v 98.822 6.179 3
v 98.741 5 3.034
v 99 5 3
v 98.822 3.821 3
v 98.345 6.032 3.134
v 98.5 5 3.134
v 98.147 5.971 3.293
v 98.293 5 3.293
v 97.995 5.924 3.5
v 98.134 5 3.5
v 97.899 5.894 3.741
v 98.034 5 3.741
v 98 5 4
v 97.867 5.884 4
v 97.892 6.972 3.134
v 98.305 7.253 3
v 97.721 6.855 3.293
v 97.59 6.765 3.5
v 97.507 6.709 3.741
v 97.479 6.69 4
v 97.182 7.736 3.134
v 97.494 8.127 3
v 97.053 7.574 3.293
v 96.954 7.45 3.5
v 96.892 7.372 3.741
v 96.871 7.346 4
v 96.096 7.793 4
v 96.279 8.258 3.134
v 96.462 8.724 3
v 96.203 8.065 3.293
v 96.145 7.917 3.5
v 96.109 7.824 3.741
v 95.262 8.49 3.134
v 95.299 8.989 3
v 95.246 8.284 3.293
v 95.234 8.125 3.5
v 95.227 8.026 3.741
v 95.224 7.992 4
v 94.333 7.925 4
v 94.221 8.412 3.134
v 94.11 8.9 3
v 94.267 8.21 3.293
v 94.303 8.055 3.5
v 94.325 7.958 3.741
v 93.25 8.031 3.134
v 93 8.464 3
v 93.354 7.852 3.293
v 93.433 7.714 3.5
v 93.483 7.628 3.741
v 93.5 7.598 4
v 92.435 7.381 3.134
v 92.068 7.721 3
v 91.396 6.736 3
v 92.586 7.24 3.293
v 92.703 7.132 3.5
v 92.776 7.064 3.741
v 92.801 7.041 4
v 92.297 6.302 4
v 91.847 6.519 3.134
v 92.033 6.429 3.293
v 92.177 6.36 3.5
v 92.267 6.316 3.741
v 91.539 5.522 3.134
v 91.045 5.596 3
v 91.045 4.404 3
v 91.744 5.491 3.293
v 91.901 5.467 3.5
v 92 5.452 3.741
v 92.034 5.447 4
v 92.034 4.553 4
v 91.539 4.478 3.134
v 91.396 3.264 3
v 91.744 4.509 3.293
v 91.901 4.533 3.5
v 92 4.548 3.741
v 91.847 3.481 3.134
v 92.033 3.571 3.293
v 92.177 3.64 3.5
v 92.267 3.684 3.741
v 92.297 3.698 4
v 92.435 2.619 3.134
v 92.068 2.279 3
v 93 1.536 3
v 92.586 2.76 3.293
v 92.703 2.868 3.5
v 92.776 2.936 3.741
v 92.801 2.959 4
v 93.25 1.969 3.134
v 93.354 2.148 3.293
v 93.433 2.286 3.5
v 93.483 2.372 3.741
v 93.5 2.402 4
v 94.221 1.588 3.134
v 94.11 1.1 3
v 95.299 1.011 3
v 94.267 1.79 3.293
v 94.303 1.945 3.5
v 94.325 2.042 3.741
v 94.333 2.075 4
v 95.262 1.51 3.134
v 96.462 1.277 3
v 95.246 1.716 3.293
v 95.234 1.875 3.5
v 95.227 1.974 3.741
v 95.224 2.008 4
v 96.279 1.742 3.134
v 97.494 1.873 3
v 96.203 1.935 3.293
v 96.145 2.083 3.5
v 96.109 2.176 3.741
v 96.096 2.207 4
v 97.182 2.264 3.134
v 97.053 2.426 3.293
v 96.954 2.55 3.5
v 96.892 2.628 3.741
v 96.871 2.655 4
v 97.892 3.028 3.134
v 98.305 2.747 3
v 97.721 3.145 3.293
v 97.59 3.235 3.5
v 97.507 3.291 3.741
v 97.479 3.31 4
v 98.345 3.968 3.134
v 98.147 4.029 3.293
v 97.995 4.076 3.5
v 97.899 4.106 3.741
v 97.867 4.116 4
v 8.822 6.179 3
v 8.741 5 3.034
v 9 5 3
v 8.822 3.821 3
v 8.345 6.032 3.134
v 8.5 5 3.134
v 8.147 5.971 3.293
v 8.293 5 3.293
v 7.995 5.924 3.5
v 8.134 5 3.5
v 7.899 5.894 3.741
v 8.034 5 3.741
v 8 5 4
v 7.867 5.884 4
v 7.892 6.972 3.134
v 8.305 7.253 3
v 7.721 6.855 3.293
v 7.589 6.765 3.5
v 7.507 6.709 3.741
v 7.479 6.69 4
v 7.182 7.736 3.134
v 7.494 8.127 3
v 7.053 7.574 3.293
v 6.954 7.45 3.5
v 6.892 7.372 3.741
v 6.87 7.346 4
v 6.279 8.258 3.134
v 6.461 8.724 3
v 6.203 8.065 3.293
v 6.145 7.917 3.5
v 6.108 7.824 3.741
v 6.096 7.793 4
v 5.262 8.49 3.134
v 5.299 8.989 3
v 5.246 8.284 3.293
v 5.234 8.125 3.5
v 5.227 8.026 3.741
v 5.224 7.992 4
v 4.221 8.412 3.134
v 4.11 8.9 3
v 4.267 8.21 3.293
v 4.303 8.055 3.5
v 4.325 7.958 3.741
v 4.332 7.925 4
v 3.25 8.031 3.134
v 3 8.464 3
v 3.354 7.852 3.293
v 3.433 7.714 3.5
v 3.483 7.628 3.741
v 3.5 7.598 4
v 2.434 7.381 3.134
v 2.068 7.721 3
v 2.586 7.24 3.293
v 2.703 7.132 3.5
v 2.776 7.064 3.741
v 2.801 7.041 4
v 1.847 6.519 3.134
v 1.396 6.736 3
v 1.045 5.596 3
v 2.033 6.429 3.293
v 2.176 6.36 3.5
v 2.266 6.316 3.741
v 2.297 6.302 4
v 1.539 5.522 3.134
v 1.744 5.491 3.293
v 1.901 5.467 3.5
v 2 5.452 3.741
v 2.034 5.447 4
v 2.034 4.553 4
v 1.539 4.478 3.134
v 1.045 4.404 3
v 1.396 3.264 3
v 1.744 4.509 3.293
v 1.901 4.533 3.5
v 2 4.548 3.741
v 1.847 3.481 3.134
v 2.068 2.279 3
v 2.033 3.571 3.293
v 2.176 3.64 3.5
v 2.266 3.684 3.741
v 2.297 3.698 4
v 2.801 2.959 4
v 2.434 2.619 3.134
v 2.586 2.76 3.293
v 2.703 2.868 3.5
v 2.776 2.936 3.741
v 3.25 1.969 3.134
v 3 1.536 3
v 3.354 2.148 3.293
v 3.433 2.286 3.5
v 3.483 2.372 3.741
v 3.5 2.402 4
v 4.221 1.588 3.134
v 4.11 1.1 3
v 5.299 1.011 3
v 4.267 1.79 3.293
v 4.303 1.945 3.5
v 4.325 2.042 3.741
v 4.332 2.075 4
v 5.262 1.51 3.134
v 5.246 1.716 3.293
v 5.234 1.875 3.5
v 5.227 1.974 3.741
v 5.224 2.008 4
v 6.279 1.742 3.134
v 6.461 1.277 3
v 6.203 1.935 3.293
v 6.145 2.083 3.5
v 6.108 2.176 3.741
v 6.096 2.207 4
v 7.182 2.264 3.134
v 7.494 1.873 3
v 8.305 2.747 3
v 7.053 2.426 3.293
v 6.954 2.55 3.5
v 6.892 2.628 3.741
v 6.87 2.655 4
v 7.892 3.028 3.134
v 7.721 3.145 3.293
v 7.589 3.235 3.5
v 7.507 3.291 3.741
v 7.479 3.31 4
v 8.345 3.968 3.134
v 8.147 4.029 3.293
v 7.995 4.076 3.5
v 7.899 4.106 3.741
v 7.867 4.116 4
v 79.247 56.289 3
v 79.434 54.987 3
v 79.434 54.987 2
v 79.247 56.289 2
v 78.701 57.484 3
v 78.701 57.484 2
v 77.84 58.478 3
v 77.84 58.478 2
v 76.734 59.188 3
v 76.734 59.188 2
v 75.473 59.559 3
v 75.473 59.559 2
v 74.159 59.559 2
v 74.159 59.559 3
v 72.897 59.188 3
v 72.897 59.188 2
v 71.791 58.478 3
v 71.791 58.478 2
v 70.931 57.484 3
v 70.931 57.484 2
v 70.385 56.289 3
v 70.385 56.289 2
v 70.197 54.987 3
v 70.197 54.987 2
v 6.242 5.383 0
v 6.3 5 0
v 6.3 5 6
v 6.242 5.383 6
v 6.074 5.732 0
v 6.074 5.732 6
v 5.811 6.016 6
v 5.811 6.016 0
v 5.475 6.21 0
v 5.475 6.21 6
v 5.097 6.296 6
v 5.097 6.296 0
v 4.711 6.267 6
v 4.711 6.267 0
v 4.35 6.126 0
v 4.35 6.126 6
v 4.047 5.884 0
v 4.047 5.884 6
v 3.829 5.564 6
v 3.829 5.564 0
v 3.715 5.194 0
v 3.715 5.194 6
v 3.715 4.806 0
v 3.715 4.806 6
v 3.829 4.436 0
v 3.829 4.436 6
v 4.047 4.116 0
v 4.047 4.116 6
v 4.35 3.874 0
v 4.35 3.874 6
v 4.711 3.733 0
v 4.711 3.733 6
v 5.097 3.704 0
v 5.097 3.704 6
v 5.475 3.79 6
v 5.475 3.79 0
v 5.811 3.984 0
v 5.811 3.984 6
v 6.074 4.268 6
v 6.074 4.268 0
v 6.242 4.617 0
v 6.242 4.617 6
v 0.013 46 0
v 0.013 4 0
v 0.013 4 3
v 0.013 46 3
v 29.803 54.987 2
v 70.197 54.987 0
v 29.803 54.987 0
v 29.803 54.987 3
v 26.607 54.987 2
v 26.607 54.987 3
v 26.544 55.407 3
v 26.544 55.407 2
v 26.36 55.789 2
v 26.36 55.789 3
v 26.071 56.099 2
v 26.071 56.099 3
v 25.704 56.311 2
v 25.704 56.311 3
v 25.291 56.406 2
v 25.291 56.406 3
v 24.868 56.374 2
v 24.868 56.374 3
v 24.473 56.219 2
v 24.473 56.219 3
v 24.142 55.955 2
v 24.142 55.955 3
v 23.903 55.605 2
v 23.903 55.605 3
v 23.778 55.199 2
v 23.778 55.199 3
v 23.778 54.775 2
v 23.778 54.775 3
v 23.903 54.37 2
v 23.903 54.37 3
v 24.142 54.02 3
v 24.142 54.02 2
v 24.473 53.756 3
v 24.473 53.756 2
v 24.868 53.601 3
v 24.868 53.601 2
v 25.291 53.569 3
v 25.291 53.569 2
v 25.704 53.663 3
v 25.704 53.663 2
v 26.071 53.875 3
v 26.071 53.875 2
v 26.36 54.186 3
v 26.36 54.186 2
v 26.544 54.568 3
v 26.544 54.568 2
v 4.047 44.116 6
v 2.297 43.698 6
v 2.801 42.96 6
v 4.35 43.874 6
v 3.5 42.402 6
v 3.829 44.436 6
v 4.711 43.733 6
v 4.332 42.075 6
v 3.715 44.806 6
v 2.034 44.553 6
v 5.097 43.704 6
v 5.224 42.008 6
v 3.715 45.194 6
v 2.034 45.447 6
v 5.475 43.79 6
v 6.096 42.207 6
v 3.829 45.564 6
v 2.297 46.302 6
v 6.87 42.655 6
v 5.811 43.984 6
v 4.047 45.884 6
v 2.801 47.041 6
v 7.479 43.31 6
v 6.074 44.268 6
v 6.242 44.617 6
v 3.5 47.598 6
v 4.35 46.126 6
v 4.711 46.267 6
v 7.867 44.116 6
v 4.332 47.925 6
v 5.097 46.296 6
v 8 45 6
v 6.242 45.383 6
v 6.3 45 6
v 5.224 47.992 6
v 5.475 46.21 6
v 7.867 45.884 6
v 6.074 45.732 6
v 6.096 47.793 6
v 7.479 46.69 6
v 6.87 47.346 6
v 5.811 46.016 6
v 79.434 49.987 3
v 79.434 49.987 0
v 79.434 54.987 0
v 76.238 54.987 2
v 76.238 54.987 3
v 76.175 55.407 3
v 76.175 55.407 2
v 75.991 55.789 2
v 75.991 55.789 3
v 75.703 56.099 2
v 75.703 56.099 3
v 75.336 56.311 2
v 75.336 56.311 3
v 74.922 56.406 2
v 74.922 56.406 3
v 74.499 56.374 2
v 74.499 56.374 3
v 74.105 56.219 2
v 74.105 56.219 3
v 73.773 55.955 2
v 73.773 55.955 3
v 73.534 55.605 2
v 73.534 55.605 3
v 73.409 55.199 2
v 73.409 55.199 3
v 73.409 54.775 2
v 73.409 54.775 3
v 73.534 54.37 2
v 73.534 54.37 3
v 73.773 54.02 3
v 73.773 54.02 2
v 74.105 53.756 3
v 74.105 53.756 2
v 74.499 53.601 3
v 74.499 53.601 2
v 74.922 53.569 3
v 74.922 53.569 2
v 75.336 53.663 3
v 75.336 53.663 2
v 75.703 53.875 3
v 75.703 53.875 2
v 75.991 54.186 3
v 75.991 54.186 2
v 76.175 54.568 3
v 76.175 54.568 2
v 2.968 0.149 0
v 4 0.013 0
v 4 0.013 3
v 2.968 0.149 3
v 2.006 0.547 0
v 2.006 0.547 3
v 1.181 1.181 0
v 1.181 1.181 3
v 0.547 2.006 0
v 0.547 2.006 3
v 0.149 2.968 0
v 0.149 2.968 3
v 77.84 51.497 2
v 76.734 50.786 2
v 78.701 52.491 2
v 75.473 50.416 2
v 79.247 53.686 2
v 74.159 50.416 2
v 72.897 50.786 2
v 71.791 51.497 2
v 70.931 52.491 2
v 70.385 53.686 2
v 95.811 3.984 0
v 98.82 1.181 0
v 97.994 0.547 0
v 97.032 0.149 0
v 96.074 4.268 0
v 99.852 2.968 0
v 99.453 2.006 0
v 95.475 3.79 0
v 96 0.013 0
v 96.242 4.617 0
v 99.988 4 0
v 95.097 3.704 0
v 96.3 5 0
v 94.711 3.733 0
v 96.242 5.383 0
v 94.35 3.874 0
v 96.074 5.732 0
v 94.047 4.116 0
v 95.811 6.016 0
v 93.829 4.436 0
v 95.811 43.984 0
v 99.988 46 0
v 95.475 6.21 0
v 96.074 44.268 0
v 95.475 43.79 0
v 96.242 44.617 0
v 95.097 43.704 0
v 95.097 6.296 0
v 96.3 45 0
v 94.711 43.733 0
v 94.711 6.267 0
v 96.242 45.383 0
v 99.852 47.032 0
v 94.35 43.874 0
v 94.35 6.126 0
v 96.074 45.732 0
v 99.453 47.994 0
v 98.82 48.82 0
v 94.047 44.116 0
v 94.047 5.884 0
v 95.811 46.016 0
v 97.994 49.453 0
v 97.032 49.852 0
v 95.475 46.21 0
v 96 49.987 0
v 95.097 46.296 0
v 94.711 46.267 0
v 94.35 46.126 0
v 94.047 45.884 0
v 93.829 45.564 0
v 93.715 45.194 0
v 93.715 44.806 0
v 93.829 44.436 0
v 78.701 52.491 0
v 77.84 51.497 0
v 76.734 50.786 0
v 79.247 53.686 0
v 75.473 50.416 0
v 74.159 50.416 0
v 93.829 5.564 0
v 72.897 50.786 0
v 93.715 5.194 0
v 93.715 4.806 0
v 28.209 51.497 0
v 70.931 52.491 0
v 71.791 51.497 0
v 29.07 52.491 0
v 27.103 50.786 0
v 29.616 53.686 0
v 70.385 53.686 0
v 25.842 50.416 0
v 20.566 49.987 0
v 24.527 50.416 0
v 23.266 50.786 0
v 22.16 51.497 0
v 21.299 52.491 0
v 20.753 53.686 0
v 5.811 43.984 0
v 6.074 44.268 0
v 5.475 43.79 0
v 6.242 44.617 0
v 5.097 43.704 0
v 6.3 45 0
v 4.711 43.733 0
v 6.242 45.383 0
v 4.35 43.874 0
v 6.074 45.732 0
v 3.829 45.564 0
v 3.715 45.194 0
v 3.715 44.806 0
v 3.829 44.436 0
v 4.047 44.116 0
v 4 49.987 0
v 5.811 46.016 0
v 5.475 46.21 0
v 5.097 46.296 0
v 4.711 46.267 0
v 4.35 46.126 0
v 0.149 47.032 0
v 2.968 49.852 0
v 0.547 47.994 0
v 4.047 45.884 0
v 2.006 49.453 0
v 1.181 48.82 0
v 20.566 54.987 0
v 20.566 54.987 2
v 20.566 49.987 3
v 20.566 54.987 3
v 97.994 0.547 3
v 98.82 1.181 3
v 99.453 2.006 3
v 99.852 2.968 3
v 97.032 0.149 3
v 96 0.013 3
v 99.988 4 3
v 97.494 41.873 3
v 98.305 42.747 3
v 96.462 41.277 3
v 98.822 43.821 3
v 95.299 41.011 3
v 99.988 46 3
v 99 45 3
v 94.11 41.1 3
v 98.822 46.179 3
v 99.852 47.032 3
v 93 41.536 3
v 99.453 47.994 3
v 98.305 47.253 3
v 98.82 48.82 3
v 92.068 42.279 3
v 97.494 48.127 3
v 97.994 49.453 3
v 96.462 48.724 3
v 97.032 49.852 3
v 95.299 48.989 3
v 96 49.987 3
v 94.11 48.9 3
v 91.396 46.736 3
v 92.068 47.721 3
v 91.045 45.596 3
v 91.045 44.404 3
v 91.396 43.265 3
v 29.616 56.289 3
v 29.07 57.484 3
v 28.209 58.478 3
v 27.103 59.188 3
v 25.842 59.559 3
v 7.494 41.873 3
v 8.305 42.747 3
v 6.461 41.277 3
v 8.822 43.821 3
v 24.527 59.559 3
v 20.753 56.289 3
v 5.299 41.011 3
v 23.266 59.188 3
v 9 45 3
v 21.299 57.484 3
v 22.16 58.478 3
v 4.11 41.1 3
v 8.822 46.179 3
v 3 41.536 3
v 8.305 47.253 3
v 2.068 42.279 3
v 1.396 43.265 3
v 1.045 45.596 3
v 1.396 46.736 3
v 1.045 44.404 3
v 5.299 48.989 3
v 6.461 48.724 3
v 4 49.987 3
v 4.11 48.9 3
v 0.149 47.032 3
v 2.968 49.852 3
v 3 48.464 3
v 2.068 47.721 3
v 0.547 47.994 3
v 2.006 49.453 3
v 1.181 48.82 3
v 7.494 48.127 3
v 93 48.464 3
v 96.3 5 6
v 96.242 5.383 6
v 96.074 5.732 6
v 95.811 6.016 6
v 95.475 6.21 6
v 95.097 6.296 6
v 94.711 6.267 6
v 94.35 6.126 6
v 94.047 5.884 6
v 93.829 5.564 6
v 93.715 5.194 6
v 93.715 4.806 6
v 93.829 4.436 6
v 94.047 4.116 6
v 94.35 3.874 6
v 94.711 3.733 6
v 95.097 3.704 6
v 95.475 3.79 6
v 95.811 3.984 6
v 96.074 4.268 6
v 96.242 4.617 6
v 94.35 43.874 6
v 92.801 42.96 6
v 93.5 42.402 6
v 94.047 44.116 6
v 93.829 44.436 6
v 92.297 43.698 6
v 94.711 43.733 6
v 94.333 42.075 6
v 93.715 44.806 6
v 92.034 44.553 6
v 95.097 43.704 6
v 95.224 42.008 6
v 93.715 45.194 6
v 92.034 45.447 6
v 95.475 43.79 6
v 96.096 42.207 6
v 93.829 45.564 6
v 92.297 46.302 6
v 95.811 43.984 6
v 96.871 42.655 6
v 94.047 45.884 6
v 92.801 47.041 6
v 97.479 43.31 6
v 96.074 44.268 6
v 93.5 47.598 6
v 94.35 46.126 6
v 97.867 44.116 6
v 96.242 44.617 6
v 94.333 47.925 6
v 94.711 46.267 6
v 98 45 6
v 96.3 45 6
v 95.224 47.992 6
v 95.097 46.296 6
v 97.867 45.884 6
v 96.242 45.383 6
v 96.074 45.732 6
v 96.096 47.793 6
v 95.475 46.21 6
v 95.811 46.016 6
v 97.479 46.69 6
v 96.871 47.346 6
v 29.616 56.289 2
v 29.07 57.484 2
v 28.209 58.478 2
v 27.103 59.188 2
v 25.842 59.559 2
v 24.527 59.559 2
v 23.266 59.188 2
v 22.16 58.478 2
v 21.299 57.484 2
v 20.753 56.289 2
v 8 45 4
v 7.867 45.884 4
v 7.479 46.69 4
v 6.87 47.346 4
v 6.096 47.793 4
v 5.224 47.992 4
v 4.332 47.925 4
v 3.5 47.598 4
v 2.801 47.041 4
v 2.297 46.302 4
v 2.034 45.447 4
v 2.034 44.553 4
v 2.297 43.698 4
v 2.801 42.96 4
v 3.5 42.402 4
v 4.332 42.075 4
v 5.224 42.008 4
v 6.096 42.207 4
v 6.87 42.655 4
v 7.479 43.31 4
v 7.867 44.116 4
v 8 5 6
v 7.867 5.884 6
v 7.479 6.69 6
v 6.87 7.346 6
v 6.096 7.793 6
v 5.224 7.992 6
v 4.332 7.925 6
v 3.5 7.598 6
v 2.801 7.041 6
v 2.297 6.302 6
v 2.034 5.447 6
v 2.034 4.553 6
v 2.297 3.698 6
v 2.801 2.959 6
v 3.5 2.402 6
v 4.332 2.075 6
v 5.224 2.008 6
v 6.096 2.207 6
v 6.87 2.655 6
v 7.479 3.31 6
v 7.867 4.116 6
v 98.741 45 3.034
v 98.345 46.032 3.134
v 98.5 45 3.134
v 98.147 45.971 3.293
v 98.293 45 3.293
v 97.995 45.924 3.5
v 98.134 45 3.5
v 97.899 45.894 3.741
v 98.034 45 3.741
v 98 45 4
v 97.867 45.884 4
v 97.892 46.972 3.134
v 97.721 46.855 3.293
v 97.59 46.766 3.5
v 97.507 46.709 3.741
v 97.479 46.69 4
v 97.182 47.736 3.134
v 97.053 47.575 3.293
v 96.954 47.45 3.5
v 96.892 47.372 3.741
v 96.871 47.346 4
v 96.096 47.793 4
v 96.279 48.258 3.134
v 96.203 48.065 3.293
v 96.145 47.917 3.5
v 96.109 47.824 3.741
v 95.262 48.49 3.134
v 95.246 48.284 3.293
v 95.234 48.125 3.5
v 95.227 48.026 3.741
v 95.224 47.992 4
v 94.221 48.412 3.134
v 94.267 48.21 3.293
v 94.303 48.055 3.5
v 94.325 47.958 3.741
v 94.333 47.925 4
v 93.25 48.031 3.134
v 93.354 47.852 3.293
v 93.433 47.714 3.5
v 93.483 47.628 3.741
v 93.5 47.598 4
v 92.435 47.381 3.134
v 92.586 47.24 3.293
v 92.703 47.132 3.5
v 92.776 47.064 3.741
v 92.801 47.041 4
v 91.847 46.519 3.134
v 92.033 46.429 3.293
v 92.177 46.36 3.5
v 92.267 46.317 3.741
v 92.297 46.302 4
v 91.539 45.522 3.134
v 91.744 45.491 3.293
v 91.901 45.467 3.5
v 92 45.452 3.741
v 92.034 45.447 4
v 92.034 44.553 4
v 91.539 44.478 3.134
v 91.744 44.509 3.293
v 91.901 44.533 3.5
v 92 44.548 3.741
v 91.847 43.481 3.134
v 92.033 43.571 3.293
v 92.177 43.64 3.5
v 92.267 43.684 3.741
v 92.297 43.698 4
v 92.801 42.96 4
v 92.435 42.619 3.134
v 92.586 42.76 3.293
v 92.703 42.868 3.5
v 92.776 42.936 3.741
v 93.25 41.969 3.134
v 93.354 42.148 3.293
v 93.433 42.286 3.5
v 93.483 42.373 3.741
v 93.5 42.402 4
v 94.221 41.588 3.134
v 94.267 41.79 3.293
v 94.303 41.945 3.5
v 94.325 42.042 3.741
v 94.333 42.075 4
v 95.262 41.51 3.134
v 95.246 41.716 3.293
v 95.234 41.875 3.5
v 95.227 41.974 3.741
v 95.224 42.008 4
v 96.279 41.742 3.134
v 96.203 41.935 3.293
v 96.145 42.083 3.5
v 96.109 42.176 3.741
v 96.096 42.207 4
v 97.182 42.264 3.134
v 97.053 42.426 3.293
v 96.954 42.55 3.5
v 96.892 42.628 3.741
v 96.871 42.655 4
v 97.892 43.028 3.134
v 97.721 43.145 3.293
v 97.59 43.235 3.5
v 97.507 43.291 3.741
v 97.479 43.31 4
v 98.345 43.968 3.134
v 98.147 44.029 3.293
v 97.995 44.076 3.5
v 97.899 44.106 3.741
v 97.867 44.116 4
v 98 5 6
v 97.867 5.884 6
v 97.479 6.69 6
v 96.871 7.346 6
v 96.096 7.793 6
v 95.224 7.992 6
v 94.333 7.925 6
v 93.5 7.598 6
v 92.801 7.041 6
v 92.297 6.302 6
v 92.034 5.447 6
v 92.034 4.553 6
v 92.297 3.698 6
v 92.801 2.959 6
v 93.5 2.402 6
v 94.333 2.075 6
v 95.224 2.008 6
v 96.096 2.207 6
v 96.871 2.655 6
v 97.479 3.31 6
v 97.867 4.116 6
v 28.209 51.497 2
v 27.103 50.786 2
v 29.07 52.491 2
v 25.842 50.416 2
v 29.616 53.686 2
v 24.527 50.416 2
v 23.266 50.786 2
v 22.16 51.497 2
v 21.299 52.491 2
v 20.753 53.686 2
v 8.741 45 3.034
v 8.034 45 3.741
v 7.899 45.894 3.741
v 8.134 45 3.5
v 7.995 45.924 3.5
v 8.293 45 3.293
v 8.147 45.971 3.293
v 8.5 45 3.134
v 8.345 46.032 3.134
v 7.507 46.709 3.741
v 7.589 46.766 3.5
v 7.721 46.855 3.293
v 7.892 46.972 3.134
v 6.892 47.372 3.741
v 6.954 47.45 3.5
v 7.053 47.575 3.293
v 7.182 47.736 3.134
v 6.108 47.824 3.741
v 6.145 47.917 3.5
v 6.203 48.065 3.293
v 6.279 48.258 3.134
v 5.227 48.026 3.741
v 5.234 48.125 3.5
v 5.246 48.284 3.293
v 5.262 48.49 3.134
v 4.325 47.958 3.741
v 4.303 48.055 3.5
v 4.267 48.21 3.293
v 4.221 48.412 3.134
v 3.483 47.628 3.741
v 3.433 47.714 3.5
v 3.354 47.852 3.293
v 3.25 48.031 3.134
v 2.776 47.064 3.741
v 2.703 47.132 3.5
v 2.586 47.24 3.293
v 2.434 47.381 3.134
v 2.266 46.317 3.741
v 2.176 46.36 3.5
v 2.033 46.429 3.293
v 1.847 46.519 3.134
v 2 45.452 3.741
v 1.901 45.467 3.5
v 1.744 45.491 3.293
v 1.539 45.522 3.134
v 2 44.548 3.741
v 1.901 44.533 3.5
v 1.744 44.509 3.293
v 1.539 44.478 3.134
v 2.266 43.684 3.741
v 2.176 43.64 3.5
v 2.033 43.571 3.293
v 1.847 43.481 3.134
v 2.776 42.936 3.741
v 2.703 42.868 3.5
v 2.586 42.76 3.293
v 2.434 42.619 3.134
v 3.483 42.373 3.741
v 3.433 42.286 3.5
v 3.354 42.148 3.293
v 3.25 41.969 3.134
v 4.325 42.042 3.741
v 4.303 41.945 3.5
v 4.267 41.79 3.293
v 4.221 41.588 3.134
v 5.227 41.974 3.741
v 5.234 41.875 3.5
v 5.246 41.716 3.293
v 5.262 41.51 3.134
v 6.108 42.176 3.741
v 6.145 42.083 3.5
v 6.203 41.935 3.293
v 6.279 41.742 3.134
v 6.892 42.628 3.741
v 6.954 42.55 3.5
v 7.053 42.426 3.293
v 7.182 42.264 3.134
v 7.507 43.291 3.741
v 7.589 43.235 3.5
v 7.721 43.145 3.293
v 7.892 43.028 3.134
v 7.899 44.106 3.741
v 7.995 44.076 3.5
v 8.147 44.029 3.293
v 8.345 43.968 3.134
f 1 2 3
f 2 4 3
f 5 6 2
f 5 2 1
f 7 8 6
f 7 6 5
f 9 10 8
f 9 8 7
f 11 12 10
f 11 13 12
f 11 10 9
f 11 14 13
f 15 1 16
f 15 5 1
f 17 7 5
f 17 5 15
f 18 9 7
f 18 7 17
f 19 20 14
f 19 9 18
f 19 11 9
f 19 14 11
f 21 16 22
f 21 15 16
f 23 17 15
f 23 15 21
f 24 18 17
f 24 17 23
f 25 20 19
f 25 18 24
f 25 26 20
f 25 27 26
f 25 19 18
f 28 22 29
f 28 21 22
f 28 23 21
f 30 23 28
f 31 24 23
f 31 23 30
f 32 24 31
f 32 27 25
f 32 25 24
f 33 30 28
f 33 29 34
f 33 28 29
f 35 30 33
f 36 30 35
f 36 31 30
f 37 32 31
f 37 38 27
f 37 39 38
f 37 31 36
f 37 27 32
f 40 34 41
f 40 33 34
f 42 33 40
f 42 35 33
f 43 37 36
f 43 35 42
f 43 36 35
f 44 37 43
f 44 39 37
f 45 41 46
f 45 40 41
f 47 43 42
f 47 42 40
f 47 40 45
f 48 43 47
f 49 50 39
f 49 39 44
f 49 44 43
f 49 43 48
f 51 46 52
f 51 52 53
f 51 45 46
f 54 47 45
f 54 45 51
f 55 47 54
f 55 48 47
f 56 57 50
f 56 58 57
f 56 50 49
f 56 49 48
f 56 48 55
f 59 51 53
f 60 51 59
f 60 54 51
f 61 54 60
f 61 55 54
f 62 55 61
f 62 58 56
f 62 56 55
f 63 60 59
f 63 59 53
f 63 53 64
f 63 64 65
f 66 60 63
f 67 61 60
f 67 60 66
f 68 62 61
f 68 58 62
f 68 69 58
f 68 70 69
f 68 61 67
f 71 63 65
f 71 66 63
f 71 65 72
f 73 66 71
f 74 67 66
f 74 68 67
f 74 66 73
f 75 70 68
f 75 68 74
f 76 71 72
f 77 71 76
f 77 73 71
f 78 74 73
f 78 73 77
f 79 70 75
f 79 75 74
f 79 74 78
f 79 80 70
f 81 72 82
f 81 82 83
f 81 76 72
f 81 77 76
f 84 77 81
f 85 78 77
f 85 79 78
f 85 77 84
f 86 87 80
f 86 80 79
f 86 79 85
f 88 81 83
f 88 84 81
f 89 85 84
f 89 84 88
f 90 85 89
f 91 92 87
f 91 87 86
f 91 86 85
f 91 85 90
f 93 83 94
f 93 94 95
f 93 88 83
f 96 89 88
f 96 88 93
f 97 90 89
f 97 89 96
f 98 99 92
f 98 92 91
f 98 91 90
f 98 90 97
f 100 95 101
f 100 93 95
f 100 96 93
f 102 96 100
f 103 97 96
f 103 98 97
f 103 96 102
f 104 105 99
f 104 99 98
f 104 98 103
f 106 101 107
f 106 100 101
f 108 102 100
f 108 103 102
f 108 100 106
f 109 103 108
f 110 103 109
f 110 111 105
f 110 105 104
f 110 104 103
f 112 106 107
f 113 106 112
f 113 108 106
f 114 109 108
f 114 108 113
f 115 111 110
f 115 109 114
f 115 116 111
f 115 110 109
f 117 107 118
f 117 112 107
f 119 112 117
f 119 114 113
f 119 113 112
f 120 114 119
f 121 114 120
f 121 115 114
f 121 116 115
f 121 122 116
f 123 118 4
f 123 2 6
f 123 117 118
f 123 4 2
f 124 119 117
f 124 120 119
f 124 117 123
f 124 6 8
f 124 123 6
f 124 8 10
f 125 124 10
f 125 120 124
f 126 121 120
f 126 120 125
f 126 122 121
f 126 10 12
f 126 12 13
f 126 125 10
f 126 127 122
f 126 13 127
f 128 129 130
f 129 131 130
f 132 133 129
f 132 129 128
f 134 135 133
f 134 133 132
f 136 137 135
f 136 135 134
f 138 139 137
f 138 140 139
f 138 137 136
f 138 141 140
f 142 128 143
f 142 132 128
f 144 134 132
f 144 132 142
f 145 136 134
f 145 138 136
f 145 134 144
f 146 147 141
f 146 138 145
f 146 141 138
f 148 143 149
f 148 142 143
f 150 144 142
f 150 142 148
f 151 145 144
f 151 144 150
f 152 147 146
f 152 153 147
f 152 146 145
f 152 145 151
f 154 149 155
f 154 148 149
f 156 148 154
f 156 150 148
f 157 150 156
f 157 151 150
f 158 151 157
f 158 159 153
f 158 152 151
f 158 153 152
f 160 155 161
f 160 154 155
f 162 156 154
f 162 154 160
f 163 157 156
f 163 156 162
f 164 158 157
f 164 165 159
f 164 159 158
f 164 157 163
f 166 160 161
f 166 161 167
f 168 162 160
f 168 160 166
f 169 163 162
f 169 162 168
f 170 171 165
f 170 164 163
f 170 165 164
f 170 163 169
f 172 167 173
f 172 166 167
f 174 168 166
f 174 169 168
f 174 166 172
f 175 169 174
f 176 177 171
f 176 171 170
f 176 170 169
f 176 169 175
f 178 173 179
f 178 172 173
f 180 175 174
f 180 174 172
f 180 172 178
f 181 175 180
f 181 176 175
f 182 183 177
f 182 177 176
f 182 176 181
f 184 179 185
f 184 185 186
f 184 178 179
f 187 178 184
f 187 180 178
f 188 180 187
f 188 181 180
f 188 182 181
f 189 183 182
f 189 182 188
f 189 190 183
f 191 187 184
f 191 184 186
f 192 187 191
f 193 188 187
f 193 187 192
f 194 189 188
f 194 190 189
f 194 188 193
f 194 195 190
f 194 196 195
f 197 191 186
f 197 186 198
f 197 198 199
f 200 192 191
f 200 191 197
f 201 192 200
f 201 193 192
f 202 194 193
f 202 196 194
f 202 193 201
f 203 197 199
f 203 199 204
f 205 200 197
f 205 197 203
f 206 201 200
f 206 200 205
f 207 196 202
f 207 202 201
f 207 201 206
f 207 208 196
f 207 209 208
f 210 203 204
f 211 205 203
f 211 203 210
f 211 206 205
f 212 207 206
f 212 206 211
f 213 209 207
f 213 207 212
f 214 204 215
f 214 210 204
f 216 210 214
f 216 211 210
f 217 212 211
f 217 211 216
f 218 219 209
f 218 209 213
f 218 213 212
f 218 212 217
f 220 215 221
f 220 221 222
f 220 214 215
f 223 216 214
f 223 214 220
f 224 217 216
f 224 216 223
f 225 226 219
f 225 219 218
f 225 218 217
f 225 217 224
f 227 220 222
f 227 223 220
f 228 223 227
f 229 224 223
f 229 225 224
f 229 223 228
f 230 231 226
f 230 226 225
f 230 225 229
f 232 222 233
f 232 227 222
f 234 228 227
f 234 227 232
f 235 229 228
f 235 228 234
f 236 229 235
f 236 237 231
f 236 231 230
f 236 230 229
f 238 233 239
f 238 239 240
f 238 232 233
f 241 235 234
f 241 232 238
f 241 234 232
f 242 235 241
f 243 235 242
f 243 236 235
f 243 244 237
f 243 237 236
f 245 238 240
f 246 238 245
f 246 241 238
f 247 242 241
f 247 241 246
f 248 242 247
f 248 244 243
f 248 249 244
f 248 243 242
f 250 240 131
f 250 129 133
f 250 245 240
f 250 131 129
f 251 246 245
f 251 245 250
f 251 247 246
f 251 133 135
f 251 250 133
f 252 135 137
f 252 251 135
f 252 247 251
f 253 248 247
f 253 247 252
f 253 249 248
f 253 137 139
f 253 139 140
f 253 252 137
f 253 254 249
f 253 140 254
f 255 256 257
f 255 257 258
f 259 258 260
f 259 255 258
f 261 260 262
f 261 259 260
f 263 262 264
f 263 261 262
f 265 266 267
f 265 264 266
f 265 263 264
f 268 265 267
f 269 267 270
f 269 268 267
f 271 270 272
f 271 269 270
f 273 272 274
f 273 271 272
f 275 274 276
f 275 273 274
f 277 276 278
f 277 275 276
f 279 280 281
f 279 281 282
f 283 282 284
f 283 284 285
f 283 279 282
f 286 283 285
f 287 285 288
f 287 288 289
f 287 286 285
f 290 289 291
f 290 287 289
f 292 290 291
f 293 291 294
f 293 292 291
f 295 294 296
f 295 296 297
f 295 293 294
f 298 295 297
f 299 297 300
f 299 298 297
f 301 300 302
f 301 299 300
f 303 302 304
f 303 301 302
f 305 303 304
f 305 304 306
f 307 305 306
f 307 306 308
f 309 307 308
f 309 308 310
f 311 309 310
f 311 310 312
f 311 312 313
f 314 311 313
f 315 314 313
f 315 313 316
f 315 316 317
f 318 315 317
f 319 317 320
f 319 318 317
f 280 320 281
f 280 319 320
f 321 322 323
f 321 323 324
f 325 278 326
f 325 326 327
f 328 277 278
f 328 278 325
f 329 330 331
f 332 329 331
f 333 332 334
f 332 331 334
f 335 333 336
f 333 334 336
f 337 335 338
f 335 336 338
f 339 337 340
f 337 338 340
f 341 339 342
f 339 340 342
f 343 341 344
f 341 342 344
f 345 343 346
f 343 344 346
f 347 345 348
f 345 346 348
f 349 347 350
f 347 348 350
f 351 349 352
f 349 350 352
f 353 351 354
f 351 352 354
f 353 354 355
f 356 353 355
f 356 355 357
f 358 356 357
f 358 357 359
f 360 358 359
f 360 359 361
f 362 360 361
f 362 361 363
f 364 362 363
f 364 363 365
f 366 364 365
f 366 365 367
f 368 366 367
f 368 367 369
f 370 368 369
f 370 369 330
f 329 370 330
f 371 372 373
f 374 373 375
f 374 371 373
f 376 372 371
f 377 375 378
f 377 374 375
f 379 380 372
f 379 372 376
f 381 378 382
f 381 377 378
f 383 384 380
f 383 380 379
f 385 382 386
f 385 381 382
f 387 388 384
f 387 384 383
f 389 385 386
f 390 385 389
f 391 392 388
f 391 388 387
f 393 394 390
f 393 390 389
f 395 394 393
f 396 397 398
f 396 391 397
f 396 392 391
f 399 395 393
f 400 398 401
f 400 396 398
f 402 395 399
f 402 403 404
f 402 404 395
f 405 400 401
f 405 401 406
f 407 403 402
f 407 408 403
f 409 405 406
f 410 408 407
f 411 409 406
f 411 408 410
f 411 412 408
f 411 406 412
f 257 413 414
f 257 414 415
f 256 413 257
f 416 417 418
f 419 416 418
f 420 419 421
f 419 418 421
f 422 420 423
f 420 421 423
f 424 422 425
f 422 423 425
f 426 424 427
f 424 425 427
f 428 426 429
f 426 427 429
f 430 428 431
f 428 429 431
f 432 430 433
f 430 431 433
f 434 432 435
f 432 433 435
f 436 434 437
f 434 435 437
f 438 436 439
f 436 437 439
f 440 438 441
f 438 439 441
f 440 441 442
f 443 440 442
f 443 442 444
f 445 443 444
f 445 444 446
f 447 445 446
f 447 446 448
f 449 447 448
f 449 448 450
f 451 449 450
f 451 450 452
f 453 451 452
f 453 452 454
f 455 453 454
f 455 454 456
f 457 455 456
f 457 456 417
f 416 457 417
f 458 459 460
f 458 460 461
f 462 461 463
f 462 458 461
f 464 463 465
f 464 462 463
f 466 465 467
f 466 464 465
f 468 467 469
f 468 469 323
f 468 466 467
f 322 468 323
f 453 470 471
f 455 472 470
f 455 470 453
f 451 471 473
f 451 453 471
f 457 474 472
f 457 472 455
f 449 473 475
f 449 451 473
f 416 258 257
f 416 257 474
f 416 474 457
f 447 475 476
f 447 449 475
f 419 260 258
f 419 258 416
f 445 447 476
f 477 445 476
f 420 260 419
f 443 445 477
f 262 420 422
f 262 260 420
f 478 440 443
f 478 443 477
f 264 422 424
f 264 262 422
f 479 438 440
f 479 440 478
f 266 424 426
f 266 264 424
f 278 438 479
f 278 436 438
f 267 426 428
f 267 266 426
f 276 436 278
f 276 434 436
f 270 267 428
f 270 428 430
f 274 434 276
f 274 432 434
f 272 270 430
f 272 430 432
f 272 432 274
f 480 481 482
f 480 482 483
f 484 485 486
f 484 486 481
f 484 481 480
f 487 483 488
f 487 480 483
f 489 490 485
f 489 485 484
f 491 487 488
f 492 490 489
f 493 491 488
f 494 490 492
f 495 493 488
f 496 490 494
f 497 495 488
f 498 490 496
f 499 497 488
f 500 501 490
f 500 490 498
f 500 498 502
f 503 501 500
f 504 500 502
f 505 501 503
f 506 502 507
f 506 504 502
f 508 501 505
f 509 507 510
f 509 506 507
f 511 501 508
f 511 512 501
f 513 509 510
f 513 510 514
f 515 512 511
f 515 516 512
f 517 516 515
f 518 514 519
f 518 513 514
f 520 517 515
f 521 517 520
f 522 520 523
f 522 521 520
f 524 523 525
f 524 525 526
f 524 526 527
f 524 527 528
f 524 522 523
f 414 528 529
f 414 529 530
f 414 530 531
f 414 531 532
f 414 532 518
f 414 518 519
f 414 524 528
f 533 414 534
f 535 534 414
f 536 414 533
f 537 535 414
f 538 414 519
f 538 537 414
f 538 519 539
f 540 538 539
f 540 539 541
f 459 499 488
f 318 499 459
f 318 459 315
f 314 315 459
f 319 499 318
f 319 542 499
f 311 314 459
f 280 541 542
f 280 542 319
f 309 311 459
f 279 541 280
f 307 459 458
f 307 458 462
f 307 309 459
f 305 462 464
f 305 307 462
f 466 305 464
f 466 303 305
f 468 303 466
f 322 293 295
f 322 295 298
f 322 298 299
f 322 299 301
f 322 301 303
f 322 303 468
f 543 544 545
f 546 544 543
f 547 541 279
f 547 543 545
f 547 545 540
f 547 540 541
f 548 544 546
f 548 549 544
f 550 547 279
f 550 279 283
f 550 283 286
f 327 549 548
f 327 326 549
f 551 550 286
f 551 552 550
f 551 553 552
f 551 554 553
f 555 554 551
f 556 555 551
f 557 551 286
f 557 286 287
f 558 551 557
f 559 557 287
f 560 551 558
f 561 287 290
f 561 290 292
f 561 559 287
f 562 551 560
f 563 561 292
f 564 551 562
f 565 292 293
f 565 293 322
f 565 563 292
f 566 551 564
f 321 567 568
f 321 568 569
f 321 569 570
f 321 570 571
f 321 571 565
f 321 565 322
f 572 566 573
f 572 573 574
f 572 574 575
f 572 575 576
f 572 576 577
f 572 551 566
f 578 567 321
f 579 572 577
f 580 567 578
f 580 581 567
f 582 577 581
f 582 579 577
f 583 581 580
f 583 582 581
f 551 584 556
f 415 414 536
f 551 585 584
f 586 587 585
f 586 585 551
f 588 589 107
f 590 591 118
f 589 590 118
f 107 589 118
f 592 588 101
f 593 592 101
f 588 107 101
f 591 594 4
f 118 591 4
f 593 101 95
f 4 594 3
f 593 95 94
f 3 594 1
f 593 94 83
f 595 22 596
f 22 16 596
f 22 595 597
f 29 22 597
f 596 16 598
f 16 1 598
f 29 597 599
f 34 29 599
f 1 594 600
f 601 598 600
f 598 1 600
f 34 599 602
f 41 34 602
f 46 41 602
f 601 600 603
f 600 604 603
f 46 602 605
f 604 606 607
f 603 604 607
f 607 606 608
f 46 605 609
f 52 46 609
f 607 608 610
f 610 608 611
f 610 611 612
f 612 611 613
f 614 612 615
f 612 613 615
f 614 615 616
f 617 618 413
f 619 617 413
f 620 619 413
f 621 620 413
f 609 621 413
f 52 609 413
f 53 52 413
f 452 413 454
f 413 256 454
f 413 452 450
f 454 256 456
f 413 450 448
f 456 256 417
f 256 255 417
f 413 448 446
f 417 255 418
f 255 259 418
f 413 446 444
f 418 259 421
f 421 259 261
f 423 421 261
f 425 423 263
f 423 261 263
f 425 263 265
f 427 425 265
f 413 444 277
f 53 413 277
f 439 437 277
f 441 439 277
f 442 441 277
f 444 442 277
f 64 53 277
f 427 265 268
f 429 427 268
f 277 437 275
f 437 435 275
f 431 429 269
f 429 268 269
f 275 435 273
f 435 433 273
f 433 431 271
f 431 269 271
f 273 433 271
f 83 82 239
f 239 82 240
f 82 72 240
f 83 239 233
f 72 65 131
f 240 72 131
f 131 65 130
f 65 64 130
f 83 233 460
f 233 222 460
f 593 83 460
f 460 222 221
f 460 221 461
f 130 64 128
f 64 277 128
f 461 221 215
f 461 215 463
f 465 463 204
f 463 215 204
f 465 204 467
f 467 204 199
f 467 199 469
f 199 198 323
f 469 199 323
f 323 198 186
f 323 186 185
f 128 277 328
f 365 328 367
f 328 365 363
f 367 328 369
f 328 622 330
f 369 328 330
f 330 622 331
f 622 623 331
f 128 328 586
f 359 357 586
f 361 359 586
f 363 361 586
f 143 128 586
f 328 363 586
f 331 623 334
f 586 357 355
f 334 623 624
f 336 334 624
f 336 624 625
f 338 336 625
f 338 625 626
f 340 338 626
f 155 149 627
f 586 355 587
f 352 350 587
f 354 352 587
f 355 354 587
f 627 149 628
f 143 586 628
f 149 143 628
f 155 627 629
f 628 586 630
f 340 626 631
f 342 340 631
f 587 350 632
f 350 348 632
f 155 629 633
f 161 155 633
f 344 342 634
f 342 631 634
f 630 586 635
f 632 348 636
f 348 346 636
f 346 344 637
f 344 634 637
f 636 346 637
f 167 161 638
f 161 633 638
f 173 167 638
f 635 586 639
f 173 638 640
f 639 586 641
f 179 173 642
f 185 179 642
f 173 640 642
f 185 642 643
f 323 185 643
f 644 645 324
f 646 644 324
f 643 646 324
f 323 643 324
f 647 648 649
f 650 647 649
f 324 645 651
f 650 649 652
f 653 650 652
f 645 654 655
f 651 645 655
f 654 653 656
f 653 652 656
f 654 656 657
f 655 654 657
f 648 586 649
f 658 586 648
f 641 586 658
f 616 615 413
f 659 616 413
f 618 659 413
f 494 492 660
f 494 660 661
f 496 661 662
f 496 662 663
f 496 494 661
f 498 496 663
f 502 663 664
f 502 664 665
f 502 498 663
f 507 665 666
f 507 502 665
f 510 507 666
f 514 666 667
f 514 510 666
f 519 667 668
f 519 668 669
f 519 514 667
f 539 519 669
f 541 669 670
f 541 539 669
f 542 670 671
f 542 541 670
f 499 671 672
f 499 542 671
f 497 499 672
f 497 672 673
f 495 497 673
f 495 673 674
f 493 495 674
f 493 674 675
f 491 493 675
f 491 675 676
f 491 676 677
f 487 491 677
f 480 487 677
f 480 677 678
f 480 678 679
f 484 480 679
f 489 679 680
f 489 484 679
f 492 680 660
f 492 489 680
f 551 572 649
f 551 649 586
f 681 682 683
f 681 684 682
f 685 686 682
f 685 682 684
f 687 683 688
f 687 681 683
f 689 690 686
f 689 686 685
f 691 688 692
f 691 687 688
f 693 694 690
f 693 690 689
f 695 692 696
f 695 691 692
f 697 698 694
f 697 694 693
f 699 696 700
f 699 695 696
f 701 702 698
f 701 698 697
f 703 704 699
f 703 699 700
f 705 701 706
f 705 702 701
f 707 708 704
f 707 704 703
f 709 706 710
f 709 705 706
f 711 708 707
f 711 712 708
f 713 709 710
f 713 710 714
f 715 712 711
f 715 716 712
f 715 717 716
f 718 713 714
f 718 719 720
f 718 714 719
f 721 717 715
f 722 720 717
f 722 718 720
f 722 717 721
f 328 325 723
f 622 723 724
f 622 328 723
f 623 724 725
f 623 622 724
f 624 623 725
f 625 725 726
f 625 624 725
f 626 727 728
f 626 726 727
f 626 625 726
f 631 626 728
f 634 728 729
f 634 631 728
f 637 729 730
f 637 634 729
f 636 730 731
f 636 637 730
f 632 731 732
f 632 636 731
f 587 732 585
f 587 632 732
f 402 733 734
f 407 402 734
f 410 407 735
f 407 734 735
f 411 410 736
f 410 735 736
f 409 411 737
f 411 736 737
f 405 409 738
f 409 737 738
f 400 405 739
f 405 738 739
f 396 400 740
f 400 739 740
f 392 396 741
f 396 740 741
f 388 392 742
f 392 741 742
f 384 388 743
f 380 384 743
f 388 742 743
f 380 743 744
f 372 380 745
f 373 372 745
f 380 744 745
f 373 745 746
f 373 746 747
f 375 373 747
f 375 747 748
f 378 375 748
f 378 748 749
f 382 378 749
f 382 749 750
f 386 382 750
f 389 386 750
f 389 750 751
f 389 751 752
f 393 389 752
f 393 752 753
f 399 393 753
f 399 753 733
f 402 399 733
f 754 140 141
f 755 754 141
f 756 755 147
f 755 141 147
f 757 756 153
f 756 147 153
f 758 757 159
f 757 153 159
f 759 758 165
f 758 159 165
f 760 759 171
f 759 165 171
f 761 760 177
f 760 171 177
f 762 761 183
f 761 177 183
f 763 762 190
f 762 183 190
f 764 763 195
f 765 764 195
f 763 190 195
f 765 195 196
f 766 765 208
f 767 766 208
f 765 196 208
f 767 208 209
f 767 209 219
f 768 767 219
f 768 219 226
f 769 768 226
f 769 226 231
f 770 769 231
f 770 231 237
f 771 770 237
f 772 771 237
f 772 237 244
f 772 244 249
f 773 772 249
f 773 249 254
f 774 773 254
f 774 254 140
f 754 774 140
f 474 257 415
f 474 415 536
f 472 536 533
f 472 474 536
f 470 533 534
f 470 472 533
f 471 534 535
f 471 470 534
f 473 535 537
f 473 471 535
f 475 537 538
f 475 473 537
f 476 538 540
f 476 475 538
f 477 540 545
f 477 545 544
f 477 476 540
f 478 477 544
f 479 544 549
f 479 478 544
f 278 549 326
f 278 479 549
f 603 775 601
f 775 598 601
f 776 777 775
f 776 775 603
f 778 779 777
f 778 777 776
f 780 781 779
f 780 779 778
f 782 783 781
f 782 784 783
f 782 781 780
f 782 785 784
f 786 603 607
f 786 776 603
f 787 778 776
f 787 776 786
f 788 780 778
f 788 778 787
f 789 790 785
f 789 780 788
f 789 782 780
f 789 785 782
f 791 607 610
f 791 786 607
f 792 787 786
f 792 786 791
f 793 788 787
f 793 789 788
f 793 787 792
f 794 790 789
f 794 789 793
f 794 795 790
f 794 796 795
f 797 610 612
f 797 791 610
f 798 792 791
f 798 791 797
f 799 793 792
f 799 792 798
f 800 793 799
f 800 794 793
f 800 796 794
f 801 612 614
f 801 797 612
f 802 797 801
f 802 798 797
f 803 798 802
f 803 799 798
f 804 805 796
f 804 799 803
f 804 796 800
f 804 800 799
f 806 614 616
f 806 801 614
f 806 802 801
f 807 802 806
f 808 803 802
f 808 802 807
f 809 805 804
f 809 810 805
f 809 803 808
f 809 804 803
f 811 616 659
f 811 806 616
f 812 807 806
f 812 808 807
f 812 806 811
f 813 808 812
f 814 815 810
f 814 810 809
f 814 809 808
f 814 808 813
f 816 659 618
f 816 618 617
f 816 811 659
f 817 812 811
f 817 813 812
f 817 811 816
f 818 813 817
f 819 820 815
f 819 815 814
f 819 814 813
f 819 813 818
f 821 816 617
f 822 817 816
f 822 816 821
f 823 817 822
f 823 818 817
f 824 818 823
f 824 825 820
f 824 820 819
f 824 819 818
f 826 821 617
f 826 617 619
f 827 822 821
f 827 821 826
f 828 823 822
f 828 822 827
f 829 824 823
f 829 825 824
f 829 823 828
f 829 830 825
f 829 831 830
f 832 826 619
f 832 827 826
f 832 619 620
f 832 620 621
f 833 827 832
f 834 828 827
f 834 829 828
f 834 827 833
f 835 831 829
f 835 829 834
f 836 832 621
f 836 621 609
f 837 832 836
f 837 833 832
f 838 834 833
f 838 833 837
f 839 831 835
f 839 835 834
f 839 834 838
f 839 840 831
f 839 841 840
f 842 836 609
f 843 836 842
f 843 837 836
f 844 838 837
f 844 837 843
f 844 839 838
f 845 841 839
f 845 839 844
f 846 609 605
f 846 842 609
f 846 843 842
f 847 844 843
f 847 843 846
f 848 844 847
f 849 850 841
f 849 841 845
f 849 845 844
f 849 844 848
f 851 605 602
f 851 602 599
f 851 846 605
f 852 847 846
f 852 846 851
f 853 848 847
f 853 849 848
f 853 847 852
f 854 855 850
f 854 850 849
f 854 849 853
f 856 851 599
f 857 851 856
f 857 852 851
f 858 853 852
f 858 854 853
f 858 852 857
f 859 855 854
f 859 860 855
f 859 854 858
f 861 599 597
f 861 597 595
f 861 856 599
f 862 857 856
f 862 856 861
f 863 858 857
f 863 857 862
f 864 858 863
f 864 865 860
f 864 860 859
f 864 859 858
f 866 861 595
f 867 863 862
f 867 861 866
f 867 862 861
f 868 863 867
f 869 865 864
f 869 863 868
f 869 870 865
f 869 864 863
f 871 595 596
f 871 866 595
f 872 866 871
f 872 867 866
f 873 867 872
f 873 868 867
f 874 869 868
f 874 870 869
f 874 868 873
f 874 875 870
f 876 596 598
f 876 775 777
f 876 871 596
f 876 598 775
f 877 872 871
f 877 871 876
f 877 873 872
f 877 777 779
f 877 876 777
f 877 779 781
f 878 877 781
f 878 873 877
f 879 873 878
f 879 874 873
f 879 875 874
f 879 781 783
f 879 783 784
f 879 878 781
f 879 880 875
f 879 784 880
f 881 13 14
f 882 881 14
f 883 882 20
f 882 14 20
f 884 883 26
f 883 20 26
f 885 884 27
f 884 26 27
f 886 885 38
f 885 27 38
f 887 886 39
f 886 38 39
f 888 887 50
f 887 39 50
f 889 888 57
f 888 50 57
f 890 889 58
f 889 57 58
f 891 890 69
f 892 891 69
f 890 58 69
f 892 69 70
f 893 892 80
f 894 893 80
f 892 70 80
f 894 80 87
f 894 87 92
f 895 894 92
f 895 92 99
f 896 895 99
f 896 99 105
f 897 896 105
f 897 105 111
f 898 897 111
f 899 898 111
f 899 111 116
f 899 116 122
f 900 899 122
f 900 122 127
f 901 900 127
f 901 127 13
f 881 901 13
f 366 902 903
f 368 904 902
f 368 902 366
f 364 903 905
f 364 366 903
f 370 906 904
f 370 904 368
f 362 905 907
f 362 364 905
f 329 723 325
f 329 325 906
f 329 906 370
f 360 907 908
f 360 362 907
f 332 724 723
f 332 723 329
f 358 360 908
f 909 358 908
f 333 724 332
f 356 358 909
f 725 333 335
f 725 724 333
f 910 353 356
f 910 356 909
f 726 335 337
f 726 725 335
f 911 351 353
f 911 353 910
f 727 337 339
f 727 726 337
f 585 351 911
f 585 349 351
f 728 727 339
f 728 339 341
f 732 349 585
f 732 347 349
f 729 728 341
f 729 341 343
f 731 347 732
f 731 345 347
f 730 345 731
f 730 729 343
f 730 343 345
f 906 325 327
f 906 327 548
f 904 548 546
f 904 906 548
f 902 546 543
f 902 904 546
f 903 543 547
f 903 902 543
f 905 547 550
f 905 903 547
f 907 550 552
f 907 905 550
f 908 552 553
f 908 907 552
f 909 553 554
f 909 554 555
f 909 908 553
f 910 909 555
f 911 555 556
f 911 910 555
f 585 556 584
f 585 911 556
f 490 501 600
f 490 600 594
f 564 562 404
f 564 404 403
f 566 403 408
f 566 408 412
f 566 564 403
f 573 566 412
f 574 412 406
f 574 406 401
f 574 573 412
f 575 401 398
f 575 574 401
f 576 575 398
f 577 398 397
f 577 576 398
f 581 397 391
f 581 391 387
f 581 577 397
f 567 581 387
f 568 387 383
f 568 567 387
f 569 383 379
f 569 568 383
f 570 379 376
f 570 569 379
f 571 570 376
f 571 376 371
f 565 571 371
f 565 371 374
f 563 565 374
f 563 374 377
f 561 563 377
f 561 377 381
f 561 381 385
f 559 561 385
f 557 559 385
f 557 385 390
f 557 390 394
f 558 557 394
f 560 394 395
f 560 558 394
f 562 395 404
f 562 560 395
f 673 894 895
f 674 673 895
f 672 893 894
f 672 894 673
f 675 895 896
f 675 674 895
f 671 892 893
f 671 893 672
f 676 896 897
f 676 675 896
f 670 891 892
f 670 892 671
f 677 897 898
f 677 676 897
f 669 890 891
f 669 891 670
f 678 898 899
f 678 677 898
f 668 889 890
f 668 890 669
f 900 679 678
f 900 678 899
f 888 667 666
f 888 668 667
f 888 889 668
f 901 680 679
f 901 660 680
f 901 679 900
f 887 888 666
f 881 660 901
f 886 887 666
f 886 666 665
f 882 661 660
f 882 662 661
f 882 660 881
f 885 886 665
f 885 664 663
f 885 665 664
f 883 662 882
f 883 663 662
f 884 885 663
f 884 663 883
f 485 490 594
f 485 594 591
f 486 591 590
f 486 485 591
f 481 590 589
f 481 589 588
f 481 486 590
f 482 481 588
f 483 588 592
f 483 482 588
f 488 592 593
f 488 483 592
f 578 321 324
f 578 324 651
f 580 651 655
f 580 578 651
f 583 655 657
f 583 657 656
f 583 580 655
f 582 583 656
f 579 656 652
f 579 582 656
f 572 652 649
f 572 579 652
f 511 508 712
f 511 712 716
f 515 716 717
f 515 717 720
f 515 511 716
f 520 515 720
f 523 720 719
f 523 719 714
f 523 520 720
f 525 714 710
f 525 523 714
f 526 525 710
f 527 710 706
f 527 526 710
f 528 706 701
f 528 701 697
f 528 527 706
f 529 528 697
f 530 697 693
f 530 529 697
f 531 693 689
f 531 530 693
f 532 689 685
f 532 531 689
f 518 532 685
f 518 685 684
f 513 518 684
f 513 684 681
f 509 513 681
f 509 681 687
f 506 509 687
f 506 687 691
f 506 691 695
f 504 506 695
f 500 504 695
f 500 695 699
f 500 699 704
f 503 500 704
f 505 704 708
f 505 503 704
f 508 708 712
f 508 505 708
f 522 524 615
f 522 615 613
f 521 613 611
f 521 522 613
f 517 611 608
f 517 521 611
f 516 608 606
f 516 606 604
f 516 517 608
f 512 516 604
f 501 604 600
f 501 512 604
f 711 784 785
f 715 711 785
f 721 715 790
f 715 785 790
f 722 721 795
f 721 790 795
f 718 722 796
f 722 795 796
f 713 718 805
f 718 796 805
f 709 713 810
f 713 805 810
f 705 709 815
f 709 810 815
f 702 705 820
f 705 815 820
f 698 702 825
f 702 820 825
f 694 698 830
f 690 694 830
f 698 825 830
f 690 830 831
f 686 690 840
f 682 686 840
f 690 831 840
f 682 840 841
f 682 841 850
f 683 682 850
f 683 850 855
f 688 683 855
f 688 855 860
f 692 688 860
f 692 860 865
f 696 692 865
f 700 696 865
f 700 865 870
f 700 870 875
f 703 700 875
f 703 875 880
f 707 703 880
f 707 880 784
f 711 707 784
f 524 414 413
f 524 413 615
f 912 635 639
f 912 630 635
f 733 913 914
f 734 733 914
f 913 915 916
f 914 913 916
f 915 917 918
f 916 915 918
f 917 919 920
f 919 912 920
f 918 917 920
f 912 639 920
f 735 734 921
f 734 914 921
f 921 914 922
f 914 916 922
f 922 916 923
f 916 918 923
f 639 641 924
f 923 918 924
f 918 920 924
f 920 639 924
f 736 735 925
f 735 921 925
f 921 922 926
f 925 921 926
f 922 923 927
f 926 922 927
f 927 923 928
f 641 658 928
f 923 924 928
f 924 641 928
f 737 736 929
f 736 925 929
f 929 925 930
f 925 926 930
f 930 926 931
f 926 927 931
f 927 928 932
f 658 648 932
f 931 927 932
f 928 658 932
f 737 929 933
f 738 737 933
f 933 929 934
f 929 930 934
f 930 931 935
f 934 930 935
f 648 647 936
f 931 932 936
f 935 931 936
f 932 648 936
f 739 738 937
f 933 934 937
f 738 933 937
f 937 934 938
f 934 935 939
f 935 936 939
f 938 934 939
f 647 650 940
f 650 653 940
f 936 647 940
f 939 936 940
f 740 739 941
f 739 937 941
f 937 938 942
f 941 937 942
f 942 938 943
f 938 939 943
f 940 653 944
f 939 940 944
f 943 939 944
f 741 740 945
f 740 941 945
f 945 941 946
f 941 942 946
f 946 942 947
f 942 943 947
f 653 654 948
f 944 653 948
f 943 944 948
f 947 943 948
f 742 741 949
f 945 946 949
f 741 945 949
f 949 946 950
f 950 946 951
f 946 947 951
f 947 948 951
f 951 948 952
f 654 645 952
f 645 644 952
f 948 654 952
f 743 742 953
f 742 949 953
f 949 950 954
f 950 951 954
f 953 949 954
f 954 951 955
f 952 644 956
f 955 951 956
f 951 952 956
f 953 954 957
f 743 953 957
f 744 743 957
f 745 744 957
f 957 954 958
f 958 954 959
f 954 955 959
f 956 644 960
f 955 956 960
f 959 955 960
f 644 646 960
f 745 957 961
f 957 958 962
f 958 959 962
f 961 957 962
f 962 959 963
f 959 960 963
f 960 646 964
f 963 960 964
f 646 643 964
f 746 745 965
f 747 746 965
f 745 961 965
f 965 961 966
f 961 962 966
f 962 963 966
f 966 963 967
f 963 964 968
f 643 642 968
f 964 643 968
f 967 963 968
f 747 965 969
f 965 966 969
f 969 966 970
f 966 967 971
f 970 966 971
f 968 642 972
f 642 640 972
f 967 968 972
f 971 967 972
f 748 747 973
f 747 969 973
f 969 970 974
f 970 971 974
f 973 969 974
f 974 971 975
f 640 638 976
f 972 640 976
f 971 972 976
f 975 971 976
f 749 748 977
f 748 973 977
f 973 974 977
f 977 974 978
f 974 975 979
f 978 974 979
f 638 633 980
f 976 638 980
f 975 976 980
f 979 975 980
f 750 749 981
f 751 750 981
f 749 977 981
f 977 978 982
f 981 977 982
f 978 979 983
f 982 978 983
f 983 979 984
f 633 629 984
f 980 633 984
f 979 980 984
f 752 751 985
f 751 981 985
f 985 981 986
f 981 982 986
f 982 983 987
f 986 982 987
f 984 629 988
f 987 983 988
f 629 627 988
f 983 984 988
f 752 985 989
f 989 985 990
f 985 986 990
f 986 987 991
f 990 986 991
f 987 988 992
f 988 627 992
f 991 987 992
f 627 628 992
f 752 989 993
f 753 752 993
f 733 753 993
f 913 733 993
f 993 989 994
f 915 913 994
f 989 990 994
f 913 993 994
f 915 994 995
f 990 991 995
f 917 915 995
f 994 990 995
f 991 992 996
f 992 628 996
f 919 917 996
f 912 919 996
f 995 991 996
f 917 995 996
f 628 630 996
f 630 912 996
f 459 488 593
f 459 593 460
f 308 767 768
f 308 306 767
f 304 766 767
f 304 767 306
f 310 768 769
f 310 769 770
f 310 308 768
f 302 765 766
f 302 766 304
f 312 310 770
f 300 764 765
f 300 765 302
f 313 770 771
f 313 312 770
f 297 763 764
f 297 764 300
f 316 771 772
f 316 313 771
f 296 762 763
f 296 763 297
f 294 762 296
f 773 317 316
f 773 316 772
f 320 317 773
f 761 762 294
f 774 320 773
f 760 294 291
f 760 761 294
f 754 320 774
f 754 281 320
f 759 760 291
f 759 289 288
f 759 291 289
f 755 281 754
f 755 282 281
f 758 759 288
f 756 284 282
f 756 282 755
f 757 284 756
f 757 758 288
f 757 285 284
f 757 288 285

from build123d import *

# Parameters (mm, degrees)
SKETCH1_R           = 3
BOSS_EXTRUDE1_DEPTH = 3
SKETCH1_3_R         = 3
SKETCH1_3_R_2       = 1.3
BOSS_EXTRUDE2_DEPTH = 6
FILLET1_R           = 1
SKETCH2_R           = 1.4224
BOSS_EXTRUDE3_DEPTH = 3
CUT_EXTRUDE1_START  = -2
SKETCH6_R           = 4.618405104
CUT_EXTRUDE1_DEPTH  = 2


with BuildPart() as part:
    # Sketch1 → Boss-Extrude1 (new body)
    with BuildSketch(Plane.XY):
        with BuildLine():
            ThreePointArc((99.987500635, 4.00000762), (98.819645279, 1.180555381), (96.00019304, 0.012700025))
            Line((96.00019304, 0.012700025), (4.00000762, 0.012700025))
            ThreePointArc((4.00000762, 0.012700025), (1.180555381, 1.180555381), (0.012700025, 4.00000762))
            Line((0.012700025, 4.00000762), (0.012700025, 46.00009144))
            ThreePointArc((0.012700025, 46.00009144), (1.180555381, 48.819543679), (4.00000762, 49.987399035))
            Line((4.00000762, 49.987399035), (96.00019304, 49.987399035))
            ThreePointArc((96.00019304, 49.987399035), (98.819645279, 48.819543679), (99.987500635, 46.00009144))
            Line((99.987500635, 46.00009144), (99.987500635, 4.00000762))
        make_face()
        with Locations((95.0001905, 5.00001016)):
            Circle(SKETCH1_R, mode=Mode.SUBTRACT)
        with Locations((5.00001016, 5.00001016)):
            Circle(SKETCH1_R, mode=Mode.SUBTRACT)
        with Locations((95.0001905, 45.0000889)):
            Circle(SKETCH1_R, mode=Mode.SUBTRACT)
        with Locations((5.00001016, 45.0000889)):
            Circle(SKETCH1_R, mode=Mode.SUBTRACT)
    extrude(amount=BOSS_EXTRUDE1_DEPTH)

    # Sketch1<3> → Boss-Extrude2 (add)
    # profile 1 of 4: a face of its own
    with BuildSketch(Plane.XY):
        with Locations((5.00001016, 45.0000889)):
            Circle(SKETCH1_3_R)
        with Locations((5.00001016, 45.0000889)):
            Circle(SKETCH1_3_R_2, mode=Mode.SUBTRACT)
    # profile 2 of 4: a face of its own
    with BuildSketch(Plane.XY):
        with Locations((95.0001905, 45.0000889)):
            Circle(SKETCH1_3_R)
        with Locations((95.0001905, 45.0000889)):
            Circle(SKETCH1_3_R_2, mode=Mode.SUBTRACT)
    # profile 3 of 4: a face of its own
    with BuildSketch(Plane.XY):
        with Locations((95.0001905, 5.00001016)):
            Circle(SKETCH1_3_R)
        with Locations((95.0001905, 5.00001016)):
            Circle(SKETCH1_3_R_2, mode=Mode.SUBTRACT)
    # profile 4 of 4: a face of its own
    with BuildSketch(Plane.XY):
        with Locations((5.00001016, 5.00001016)):
            Circle(SKETCH1_3_R)
        with Locations((5.00001016, 5.00001016)):
            Circle(SKETCH1_3_R_2, mode=Mode.SUBTRACT)
    extrude(amount=BOSS_EXTRUDE2_DEPTH)

    # Fillet1
    fillet1_edges = [part.edges().sort_by_distance(p)[0] for p in [
        (92.0001905, 5.00001016, 3),
        (2.00001016, 5.00001016, 3),
        (92.0001905, 45.0000889, 3),
        (2.00001016, 45.0000889, 3),
    ]]
    fillet(fillet1_edges, radius=FILLET1_R)

    # Sketch2 → Boss-Extrude3 (add)
    with BuildSketch(Plane.XY.offset(3)):
        with BuildLine():
            Line((70.197495225, 54.987399035), (29.802705435, 54.987399035))
            ThreePointArc((29.802705434, 54.987399035), (25.18430033, 59.605804139), (20.565895226, 54.987399035))
            Line((20.565895225, 54.987399035), (20.565895225, 49.987399035))
            Line((20.565895225, 49.987399035), (79.434305435, 49.987399035))
            Line((79.434305435, 49.987399035), (79.434305435, 54.987399035))
            ThreePointArc((79.434305434, 54.987399035), (74.81590033, 59.605804139), (70.197495226, 54.987399035))
        make_face()
        with Locations((25.18430033, 54.987399035)):
            Circle(SKETCH2_R, mode=Mode.SUBTRACT)
        with Locations((74.81590033, 54.987399035)):
            Circle(SKETCH2_R, mode=Mode.SUBTRACT)
    extrude(amount=-BOSS_EXTRUDE3_DEPTH)

    # Sketch6 → Cut-Extrude1 (cut)
    with BuildSketch(Plane(origin=(0, 0, 0), x_dir=(-1, 0, 0), z_dir=(0, 0, -1)).offset(CUT_EXTRUDE1_START)):
        with Locations((-74.81590033, 54.987399035)):
            Circle(SKETCH6_R)
        with Locations((-25.18430033, 54.987399035)):
            Circle(SKETCH6_R)
    extrude(amount=CUT_EXTRUDE1_DEPTH, mode=Mode.SUBTRACT)


solid = part.part
